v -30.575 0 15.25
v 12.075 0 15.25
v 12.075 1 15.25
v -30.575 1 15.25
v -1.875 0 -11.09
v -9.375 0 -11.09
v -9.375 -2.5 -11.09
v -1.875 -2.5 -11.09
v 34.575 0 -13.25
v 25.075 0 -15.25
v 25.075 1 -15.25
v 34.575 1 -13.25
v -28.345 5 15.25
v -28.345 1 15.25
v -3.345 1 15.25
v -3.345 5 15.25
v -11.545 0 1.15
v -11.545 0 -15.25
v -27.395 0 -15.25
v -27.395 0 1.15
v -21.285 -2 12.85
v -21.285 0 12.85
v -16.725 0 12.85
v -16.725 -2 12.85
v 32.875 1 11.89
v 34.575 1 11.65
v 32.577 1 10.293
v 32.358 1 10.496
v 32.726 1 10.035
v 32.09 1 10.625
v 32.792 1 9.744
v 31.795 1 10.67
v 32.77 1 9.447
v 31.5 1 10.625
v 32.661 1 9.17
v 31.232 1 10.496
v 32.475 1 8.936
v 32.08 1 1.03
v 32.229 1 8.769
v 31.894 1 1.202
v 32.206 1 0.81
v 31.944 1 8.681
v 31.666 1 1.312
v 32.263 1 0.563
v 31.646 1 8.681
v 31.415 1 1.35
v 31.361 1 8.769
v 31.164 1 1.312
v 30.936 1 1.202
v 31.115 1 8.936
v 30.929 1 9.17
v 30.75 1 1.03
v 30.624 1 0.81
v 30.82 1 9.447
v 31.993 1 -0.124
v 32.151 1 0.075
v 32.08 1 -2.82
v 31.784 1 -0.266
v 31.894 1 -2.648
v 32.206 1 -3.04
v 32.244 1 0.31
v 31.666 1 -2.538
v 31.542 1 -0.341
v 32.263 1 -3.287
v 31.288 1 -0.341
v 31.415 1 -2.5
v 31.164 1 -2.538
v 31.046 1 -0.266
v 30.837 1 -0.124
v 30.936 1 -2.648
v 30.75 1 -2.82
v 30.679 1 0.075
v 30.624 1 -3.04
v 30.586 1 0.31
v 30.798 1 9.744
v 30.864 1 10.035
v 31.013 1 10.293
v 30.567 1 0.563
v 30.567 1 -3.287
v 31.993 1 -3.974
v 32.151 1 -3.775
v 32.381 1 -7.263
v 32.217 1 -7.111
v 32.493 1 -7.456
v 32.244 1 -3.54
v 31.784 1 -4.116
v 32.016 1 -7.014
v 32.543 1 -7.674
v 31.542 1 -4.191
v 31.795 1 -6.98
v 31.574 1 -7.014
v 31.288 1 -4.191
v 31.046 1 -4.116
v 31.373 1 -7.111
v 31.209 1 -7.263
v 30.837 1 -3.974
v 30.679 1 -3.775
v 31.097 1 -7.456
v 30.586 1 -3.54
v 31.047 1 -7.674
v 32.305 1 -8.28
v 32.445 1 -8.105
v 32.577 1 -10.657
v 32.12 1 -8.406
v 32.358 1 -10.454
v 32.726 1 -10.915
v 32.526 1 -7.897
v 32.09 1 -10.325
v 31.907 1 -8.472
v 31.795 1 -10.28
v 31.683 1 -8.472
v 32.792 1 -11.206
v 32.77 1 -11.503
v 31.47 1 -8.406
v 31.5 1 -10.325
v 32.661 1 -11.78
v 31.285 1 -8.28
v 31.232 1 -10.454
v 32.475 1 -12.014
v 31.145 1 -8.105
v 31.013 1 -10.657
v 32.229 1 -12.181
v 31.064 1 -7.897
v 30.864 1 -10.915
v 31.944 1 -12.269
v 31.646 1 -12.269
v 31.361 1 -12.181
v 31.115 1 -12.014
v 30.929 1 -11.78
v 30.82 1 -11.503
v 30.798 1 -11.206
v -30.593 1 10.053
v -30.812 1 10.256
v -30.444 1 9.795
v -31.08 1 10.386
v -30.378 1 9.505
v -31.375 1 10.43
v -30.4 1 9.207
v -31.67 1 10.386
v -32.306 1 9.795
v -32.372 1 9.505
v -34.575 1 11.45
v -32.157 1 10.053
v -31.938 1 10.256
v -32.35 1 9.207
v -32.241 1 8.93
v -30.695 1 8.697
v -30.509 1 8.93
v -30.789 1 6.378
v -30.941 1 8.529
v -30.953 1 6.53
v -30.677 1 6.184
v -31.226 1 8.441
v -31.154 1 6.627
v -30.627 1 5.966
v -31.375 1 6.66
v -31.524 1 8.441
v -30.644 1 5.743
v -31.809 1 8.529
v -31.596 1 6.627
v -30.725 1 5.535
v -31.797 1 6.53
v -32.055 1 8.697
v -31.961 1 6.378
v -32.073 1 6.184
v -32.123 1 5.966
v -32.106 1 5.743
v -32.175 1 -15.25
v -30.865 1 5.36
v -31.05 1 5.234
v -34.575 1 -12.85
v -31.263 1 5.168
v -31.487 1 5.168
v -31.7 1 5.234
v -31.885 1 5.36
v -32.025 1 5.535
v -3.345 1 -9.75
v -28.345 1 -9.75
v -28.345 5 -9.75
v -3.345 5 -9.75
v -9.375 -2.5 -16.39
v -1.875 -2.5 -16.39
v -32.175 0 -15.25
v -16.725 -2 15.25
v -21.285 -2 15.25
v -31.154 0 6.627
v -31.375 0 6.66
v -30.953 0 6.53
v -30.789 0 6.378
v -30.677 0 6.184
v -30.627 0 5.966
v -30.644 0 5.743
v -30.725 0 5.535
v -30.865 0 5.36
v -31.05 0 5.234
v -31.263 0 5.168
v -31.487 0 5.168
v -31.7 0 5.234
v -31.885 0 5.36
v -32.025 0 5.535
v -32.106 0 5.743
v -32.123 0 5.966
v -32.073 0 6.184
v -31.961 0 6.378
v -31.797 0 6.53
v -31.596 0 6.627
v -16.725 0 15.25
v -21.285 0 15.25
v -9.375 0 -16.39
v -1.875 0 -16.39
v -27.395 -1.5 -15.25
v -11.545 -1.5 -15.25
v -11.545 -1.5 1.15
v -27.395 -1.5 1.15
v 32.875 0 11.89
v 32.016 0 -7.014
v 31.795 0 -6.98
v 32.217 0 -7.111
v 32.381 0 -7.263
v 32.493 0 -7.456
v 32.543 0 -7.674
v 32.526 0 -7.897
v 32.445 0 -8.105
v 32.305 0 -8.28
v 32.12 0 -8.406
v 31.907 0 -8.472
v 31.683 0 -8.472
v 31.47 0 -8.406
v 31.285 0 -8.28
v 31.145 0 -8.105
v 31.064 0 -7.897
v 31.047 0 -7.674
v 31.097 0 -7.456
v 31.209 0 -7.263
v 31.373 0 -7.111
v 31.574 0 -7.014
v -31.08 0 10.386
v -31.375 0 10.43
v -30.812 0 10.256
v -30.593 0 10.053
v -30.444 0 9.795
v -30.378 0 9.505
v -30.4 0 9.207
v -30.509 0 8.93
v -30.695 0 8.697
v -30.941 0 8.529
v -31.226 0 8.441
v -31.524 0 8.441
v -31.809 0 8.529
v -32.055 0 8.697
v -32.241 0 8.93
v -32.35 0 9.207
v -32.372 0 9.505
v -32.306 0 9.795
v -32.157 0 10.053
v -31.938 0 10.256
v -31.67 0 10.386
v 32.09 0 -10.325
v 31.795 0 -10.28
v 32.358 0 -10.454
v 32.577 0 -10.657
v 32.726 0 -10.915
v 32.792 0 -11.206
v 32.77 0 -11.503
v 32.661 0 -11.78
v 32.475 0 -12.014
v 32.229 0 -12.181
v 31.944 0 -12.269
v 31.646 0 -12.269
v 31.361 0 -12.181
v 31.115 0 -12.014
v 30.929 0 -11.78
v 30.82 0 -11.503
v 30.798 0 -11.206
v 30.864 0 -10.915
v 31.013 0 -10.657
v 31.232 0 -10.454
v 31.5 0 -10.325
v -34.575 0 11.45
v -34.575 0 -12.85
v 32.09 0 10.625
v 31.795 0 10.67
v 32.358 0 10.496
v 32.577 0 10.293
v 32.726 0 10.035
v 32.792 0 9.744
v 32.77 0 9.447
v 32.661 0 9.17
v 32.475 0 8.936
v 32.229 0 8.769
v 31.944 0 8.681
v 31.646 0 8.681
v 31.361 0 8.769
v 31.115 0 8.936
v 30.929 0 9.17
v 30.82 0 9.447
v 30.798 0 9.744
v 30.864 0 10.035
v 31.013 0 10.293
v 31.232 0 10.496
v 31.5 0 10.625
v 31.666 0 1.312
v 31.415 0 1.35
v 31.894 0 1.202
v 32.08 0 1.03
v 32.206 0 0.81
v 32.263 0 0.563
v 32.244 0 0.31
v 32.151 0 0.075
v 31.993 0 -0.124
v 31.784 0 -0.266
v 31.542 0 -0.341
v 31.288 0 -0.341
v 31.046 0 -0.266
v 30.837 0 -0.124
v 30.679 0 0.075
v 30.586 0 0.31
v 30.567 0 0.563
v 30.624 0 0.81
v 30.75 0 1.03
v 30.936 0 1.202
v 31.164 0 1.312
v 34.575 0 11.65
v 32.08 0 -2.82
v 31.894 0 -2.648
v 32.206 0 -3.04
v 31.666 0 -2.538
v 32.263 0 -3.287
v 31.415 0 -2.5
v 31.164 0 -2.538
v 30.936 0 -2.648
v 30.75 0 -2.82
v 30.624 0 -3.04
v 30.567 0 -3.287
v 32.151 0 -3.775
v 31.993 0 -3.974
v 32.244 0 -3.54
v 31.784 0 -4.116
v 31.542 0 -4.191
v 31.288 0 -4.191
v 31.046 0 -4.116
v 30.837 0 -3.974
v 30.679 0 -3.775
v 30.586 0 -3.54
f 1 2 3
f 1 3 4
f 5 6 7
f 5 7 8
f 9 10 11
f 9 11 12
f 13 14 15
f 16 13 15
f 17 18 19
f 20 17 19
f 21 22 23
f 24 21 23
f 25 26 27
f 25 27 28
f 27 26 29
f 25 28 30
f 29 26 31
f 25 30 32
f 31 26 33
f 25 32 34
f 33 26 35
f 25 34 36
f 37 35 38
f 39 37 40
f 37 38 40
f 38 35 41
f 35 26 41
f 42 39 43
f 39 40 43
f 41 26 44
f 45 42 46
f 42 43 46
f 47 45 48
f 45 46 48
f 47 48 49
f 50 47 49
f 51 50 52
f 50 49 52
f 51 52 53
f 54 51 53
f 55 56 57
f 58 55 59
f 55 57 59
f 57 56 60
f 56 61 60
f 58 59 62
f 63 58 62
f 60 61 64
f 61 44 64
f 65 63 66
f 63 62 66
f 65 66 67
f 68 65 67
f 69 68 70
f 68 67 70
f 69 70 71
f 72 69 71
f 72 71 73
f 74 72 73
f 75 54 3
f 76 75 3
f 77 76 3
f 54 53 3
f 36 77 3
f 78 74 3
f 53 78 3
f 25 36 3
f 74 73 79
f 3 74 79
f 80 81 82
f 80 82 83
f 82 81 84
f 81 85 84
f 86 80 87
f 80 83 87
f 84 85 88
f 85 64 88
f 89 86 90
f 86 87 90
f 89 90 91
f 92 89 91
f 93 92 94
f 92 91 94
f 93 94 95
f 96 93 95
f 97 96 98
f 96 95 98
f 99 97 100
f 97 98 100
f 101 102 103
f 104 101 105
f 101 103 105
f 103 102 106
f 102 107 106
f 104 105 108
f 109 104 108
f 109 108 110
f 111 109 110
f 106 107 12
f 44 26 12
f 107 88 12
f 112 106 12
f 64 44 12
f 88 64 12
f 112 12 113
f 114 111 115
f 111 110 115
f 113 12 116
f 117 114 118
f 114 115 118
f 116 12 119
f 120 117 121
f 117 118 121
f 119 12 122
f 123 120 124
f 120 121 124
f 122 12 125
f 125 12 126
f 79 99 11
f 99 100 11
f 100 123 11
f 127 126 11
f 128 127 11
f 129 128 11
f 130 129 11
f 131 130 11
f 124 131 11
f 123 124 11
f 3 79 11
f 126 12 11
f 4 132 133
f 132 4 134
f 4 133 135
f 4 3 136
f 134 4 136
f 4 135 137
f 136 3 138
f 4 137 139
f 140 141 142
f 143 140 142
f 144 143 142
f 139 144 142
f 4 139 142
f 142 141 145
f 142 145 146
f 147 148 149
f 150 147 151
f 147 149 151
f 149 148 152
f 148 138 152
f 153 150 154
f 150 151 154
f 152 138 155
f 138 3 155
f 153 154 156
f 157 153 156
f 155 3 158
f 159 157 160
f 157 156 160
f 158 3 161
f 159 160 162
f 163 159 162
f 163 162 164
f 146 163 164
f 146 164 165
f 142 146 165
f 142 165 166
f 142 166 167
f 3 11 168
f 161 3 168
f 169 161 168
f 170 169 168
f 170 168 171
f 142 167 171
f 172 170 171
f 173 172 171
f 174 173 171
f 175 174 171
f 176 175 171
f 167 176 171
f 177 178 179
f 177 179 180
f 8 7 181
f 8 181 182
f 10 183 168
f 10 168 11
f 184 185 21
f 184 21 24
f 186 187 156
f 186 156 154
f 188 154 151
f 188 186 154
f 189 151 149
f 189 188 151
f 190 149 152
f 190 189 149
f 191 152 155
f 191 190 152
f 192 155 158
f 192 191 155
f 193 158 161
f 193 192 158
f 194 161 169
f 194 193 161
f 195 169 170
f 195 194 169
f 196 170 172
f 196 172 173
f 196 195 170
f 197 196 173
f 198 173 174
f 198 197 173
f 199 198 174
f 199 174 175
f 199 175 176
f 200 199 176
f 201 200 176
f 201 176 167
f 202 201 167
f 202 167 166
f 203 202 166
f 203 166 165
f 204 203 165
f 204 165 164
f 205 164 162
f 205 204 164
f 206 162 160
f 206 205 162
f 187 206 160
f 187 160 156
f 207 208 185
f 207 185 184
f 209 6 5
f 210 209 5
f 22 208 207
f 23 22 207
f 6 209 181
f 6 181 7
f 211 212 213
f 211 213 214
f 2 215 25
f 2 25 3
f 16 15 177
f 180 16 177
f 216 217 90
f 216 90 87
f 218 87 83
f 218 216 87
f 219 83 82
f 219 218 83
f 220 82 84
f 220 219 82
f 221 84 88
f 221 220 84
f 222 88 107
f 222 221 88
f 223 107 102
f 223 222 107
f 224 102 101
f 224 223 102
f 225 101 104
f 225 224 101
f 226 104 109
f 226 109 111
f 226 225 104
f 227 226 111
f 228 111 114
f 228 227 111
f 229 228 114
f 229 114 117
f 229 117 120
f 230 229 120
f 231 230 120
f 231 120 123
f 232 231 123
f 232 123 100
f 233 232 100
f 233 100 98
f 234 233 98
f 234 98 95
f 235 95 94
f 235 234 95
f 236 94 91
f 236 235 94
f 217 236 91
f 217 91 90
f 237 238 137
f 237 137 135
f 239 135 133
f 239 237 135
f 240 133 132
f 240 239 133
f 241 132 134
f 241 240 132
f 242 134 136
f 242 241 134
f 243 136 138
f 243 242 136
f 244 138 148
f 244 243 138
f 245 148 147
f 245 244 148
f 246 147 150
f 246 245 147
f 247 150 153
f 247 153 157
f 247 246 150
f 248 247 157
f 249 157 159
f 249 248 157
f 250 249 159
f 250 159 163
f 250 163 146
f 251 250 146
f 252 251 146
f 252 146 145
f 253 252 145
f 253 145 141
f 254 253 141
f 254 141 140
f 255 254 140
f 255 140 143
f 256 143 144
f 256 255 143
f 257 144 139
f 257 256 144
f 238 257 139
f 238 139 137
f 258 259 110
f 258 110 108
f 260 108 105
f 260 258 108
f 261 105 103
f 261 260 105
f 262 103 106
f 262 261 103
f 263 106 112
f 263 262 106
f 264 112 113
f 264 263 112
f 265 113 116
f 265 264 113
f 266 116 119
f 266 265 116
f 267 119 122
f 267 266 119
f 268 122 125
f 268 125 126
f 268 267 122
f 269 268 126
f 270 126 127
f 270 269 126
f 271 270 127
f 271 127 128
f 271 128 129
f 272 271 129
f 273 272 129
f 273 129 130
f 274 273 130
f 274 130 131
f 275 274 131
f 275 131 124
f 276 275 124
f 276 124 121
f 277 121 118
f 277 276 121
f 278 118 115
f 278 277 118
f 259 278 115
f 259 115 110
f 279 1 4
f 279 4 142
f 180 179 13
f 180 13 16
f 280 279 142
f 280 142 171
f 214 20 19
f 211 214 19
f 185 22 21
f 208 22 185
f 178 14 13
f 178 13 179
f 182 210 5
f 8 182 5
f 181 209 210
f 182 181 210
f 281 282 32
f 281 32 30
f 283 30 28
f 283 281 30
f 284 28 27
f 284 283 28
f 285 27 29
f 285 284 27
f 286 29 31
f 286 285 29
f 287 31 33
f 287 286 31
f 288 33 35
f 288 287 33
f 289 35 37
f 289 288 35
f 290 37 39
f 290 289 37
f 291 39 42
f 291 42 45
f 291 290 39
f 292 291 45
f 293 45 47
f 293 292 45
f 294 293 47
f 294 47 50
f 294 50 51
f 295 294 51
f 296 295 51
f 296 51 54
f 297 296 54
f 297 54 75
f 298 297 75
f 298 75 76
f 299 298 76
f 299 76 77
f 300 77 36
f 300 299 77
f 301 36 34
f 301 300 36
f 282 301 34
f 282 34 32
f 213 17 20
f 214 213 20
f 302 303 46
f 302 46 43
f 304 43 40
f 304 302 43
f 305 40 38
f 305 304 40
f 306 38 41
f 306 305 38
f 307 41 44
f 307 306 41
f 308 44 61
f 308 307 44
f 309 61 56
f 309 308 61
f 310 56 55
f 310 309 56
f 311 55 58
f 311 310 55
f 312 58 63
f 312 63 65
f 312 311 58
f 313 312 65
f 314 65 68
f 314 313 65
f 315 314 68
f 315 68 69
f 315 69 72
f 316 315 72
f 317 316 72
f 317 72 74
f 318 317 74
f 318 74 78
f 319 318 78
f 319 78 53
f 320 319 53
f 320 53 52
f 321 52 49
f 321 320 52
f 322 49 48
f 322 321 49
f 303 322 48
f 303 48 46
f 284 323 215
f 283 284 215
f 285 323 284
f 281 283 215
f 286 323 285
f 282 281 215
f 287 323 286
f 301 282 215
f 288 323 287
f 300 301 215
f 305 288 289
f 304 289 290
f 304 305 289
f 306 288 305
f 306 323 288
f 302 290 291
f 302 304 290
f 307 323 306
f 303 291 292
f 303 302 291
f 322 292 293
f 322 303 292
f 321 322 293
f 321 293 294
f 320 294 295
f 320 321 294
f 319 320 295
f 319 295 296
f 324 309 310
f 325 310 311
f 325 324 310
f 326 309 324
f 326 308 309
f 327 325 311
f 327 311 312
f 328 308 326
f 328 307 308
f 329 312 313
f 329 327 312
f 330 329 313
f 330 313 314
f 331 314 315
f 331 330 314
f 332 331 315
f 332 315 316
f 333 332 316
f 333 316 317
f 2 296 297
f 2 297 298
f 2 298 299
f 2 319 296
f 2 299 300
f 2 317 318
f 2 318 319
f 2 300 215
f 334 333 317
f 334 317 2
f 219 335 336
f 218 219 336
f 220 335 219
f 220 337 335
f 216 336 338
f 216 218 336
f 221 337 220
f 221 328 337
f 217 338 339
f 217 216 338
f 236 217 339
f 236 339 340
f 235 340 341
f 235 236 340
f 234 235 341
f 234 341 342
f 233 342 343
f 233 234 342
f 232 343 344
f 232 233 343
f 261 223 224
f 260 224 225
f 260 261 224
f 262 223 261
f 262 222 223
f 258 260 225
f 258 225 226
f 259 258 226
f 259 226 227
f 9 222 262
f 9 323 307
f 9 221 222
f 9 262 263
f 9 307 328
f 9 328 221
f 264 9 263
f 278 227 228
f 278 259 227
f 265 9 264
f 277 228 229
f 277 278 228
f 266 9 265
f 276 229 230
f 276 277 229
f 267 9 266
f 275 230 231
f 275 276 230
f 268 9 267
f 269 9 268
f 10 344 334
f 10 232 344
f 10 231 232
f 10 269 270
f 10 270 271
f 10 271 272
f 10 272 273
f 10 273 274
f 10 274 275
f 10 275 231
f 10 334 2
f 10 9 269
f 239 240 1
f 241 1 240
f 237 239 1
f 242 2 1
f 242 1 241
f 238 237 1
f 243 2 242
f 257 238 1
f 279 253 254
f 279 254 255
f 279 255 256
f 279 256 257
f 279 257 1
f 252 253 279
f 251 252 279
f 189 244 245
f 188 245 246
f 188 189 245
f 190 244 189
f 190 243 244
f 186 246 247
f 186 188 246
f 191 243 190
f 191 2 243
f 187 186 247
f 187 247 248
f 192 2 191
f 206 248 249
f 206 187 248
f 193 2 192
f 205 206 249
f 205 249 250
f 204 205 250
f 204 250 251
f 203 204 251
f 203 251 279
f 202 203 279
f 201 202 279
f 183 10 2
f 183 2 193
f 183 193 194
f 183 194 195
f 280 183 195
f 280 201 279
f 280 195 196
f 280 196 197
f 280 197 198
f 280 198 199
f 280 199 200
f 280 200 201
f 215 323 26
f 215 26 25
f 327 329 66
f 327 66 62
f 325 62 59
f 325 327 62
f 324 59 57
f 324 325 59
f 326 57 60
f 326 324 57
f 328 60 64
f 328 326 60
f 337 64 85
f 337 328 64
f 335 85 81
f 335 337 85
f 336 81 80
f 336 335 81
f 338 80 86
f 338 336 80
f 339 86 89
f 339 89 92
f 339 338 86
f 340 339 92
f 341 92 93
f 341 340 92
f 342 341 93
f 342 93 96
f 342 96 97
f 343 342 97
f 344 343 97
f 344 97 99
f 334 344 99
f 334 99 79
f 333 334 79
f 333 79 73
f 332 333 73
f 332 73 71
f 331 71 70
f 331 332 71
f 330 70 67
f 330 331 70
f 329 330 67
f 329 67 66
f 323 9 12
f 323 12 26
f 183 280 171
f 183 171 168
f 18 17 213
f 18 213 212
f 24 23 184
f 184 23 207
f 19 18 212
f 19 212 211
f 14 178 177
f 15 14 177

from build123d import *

# Parameters (mm, degrees)
SKETCH1_R           = 1
SKETCH1_R_2         = 0.85
SKETCH1_R_3         = 0.75
BOSS_EXTRUDE1_DEPTH = 1
SKETCH2_W           = 25
SKETCH2_H           = 25
BOSS_EXTRUDE2_DEPTH = 4
SKETCH3_W           = 15.85
SKETCH3_H           = 16.4
BOSS_EXTRUDE3_DEPTH = 1.5
SKETCH4_W           = 7.5
SKETCH4_H           = 5.3
BOSS_EXTRUDE4_DEPTH = 2.5
SKETCH5_W           = 4.56
SKETCH5_H           = 2.4
BOSS_EXTRUDE5_DEPTH = 2


with BuildPart() as part:
    # Sketch1 → Boss-Extrude1 (new body)
    with BuildSketch(Plane(origin=(0, 0, 0), x_dir=(1, 0, 0), z_dir=(0, 1, 0))):
        Polygon((-32.175, 15.25), (25.075, 15.25), (34.575, 13.25), (34.575, -11.65), (32.875, -11.89), (12.075, -15.25), (-30.575, -15.25), (-34.575, -11.45), (-34.575, 12.85), align=None)
        with Locations(Location((31.795, 11.280462126, 0), (0, 0, 270))):
            Circle(SKETCH1_R, mode=Mode.SUBTRACT)
        with Locations(Location((31.795, -9.669537874, 0), (0, 0, 270))):
            Circle(SKETCH1_R, mode=Mode.SUBTRACT)
        with Locations(Location((31.415, -0.499537874, 0), (0, 0, 270))):
            Circle(SKETCH1_R_2, mode=Mode.SUBTRACT)
        with Locations(Location((31.415, 3.350462126, 0), (0, 0, 270))):
            Circle(SKETCH1_R_2, mode=Mode.SUBTRACT)
        with Locations(Location((31.795, 7.730462126, 0), (0, 0, 270))):
            Circle(SKETCH1_R_3, mode=Mode.SUBTRACT)
        with Locations(Location((-31.375, -9.43, 0), (0, 0, 270))):
            Circle(SKETCH1_R, mode=Mode.SUBTRACT)
        with Locations(Location((-31.375, -5.91, 0), (0, 0, 270))):
            Circle(SKETCH1_R_3, mode=Mode.SUBTRACT)
    extrude(amount=BOSS_EXTRUDE1_DEPTH)


with BuildPart() as body_2:
    # Sketch2 → Boss-Extrude2 (new body)
    with BuildSketch(Plane(origin=(0, 1, 0), x_dir=(1, 0, 0), z_dir=(0, 1, 0))):
        with Locations((-15.845, -2.75)):
            Rectangle(SKETCH2_W, SKETCH2_H)
    extrude(amount=BOSS_EXTRUDE2_DEPTH)


with BuildPart() as body_3:
    # Sketch3 → Boss-Extrude3 (new body)
    with BuildSketch(Plane(origin=(0, 0, 0), x_dir=(-1, 0, 0), z_dir=(0, -1, 0))):
        with Locations((19.47, 7.05)):
            Rectangle(SKETCH3_W, SKETCH3_H)
    extrude(amount=BOSS_EXTRUDE3_DEPTH)


with BuildPart() as body_4:
    # Sketch4 → Boss-Extrude4 (new body)
    with BuildSketch(Plane.XZ):
        with Locations((-5.625, -13.74)):
            Rectangle(SKETCH4_W, SKETCH4_H)
    extrude(amount=BOSS_EXTRUDE4_DEPTH)


with BuildPart() as body_5:
    # Sketch5 → Boss-Extrude5 (new body)
    with BuildSketch(Plane.XZ):
        with Locations((-19.005, 14.05)):
            Rectangle(SKETCH5_W, SKETCH5_H)
    extrude(amount=BOSS_EXTRUDE5_DEPTH)


solid = Compound([part.part, body_2.part, body_3.part, body_4.part, body_5.part])
